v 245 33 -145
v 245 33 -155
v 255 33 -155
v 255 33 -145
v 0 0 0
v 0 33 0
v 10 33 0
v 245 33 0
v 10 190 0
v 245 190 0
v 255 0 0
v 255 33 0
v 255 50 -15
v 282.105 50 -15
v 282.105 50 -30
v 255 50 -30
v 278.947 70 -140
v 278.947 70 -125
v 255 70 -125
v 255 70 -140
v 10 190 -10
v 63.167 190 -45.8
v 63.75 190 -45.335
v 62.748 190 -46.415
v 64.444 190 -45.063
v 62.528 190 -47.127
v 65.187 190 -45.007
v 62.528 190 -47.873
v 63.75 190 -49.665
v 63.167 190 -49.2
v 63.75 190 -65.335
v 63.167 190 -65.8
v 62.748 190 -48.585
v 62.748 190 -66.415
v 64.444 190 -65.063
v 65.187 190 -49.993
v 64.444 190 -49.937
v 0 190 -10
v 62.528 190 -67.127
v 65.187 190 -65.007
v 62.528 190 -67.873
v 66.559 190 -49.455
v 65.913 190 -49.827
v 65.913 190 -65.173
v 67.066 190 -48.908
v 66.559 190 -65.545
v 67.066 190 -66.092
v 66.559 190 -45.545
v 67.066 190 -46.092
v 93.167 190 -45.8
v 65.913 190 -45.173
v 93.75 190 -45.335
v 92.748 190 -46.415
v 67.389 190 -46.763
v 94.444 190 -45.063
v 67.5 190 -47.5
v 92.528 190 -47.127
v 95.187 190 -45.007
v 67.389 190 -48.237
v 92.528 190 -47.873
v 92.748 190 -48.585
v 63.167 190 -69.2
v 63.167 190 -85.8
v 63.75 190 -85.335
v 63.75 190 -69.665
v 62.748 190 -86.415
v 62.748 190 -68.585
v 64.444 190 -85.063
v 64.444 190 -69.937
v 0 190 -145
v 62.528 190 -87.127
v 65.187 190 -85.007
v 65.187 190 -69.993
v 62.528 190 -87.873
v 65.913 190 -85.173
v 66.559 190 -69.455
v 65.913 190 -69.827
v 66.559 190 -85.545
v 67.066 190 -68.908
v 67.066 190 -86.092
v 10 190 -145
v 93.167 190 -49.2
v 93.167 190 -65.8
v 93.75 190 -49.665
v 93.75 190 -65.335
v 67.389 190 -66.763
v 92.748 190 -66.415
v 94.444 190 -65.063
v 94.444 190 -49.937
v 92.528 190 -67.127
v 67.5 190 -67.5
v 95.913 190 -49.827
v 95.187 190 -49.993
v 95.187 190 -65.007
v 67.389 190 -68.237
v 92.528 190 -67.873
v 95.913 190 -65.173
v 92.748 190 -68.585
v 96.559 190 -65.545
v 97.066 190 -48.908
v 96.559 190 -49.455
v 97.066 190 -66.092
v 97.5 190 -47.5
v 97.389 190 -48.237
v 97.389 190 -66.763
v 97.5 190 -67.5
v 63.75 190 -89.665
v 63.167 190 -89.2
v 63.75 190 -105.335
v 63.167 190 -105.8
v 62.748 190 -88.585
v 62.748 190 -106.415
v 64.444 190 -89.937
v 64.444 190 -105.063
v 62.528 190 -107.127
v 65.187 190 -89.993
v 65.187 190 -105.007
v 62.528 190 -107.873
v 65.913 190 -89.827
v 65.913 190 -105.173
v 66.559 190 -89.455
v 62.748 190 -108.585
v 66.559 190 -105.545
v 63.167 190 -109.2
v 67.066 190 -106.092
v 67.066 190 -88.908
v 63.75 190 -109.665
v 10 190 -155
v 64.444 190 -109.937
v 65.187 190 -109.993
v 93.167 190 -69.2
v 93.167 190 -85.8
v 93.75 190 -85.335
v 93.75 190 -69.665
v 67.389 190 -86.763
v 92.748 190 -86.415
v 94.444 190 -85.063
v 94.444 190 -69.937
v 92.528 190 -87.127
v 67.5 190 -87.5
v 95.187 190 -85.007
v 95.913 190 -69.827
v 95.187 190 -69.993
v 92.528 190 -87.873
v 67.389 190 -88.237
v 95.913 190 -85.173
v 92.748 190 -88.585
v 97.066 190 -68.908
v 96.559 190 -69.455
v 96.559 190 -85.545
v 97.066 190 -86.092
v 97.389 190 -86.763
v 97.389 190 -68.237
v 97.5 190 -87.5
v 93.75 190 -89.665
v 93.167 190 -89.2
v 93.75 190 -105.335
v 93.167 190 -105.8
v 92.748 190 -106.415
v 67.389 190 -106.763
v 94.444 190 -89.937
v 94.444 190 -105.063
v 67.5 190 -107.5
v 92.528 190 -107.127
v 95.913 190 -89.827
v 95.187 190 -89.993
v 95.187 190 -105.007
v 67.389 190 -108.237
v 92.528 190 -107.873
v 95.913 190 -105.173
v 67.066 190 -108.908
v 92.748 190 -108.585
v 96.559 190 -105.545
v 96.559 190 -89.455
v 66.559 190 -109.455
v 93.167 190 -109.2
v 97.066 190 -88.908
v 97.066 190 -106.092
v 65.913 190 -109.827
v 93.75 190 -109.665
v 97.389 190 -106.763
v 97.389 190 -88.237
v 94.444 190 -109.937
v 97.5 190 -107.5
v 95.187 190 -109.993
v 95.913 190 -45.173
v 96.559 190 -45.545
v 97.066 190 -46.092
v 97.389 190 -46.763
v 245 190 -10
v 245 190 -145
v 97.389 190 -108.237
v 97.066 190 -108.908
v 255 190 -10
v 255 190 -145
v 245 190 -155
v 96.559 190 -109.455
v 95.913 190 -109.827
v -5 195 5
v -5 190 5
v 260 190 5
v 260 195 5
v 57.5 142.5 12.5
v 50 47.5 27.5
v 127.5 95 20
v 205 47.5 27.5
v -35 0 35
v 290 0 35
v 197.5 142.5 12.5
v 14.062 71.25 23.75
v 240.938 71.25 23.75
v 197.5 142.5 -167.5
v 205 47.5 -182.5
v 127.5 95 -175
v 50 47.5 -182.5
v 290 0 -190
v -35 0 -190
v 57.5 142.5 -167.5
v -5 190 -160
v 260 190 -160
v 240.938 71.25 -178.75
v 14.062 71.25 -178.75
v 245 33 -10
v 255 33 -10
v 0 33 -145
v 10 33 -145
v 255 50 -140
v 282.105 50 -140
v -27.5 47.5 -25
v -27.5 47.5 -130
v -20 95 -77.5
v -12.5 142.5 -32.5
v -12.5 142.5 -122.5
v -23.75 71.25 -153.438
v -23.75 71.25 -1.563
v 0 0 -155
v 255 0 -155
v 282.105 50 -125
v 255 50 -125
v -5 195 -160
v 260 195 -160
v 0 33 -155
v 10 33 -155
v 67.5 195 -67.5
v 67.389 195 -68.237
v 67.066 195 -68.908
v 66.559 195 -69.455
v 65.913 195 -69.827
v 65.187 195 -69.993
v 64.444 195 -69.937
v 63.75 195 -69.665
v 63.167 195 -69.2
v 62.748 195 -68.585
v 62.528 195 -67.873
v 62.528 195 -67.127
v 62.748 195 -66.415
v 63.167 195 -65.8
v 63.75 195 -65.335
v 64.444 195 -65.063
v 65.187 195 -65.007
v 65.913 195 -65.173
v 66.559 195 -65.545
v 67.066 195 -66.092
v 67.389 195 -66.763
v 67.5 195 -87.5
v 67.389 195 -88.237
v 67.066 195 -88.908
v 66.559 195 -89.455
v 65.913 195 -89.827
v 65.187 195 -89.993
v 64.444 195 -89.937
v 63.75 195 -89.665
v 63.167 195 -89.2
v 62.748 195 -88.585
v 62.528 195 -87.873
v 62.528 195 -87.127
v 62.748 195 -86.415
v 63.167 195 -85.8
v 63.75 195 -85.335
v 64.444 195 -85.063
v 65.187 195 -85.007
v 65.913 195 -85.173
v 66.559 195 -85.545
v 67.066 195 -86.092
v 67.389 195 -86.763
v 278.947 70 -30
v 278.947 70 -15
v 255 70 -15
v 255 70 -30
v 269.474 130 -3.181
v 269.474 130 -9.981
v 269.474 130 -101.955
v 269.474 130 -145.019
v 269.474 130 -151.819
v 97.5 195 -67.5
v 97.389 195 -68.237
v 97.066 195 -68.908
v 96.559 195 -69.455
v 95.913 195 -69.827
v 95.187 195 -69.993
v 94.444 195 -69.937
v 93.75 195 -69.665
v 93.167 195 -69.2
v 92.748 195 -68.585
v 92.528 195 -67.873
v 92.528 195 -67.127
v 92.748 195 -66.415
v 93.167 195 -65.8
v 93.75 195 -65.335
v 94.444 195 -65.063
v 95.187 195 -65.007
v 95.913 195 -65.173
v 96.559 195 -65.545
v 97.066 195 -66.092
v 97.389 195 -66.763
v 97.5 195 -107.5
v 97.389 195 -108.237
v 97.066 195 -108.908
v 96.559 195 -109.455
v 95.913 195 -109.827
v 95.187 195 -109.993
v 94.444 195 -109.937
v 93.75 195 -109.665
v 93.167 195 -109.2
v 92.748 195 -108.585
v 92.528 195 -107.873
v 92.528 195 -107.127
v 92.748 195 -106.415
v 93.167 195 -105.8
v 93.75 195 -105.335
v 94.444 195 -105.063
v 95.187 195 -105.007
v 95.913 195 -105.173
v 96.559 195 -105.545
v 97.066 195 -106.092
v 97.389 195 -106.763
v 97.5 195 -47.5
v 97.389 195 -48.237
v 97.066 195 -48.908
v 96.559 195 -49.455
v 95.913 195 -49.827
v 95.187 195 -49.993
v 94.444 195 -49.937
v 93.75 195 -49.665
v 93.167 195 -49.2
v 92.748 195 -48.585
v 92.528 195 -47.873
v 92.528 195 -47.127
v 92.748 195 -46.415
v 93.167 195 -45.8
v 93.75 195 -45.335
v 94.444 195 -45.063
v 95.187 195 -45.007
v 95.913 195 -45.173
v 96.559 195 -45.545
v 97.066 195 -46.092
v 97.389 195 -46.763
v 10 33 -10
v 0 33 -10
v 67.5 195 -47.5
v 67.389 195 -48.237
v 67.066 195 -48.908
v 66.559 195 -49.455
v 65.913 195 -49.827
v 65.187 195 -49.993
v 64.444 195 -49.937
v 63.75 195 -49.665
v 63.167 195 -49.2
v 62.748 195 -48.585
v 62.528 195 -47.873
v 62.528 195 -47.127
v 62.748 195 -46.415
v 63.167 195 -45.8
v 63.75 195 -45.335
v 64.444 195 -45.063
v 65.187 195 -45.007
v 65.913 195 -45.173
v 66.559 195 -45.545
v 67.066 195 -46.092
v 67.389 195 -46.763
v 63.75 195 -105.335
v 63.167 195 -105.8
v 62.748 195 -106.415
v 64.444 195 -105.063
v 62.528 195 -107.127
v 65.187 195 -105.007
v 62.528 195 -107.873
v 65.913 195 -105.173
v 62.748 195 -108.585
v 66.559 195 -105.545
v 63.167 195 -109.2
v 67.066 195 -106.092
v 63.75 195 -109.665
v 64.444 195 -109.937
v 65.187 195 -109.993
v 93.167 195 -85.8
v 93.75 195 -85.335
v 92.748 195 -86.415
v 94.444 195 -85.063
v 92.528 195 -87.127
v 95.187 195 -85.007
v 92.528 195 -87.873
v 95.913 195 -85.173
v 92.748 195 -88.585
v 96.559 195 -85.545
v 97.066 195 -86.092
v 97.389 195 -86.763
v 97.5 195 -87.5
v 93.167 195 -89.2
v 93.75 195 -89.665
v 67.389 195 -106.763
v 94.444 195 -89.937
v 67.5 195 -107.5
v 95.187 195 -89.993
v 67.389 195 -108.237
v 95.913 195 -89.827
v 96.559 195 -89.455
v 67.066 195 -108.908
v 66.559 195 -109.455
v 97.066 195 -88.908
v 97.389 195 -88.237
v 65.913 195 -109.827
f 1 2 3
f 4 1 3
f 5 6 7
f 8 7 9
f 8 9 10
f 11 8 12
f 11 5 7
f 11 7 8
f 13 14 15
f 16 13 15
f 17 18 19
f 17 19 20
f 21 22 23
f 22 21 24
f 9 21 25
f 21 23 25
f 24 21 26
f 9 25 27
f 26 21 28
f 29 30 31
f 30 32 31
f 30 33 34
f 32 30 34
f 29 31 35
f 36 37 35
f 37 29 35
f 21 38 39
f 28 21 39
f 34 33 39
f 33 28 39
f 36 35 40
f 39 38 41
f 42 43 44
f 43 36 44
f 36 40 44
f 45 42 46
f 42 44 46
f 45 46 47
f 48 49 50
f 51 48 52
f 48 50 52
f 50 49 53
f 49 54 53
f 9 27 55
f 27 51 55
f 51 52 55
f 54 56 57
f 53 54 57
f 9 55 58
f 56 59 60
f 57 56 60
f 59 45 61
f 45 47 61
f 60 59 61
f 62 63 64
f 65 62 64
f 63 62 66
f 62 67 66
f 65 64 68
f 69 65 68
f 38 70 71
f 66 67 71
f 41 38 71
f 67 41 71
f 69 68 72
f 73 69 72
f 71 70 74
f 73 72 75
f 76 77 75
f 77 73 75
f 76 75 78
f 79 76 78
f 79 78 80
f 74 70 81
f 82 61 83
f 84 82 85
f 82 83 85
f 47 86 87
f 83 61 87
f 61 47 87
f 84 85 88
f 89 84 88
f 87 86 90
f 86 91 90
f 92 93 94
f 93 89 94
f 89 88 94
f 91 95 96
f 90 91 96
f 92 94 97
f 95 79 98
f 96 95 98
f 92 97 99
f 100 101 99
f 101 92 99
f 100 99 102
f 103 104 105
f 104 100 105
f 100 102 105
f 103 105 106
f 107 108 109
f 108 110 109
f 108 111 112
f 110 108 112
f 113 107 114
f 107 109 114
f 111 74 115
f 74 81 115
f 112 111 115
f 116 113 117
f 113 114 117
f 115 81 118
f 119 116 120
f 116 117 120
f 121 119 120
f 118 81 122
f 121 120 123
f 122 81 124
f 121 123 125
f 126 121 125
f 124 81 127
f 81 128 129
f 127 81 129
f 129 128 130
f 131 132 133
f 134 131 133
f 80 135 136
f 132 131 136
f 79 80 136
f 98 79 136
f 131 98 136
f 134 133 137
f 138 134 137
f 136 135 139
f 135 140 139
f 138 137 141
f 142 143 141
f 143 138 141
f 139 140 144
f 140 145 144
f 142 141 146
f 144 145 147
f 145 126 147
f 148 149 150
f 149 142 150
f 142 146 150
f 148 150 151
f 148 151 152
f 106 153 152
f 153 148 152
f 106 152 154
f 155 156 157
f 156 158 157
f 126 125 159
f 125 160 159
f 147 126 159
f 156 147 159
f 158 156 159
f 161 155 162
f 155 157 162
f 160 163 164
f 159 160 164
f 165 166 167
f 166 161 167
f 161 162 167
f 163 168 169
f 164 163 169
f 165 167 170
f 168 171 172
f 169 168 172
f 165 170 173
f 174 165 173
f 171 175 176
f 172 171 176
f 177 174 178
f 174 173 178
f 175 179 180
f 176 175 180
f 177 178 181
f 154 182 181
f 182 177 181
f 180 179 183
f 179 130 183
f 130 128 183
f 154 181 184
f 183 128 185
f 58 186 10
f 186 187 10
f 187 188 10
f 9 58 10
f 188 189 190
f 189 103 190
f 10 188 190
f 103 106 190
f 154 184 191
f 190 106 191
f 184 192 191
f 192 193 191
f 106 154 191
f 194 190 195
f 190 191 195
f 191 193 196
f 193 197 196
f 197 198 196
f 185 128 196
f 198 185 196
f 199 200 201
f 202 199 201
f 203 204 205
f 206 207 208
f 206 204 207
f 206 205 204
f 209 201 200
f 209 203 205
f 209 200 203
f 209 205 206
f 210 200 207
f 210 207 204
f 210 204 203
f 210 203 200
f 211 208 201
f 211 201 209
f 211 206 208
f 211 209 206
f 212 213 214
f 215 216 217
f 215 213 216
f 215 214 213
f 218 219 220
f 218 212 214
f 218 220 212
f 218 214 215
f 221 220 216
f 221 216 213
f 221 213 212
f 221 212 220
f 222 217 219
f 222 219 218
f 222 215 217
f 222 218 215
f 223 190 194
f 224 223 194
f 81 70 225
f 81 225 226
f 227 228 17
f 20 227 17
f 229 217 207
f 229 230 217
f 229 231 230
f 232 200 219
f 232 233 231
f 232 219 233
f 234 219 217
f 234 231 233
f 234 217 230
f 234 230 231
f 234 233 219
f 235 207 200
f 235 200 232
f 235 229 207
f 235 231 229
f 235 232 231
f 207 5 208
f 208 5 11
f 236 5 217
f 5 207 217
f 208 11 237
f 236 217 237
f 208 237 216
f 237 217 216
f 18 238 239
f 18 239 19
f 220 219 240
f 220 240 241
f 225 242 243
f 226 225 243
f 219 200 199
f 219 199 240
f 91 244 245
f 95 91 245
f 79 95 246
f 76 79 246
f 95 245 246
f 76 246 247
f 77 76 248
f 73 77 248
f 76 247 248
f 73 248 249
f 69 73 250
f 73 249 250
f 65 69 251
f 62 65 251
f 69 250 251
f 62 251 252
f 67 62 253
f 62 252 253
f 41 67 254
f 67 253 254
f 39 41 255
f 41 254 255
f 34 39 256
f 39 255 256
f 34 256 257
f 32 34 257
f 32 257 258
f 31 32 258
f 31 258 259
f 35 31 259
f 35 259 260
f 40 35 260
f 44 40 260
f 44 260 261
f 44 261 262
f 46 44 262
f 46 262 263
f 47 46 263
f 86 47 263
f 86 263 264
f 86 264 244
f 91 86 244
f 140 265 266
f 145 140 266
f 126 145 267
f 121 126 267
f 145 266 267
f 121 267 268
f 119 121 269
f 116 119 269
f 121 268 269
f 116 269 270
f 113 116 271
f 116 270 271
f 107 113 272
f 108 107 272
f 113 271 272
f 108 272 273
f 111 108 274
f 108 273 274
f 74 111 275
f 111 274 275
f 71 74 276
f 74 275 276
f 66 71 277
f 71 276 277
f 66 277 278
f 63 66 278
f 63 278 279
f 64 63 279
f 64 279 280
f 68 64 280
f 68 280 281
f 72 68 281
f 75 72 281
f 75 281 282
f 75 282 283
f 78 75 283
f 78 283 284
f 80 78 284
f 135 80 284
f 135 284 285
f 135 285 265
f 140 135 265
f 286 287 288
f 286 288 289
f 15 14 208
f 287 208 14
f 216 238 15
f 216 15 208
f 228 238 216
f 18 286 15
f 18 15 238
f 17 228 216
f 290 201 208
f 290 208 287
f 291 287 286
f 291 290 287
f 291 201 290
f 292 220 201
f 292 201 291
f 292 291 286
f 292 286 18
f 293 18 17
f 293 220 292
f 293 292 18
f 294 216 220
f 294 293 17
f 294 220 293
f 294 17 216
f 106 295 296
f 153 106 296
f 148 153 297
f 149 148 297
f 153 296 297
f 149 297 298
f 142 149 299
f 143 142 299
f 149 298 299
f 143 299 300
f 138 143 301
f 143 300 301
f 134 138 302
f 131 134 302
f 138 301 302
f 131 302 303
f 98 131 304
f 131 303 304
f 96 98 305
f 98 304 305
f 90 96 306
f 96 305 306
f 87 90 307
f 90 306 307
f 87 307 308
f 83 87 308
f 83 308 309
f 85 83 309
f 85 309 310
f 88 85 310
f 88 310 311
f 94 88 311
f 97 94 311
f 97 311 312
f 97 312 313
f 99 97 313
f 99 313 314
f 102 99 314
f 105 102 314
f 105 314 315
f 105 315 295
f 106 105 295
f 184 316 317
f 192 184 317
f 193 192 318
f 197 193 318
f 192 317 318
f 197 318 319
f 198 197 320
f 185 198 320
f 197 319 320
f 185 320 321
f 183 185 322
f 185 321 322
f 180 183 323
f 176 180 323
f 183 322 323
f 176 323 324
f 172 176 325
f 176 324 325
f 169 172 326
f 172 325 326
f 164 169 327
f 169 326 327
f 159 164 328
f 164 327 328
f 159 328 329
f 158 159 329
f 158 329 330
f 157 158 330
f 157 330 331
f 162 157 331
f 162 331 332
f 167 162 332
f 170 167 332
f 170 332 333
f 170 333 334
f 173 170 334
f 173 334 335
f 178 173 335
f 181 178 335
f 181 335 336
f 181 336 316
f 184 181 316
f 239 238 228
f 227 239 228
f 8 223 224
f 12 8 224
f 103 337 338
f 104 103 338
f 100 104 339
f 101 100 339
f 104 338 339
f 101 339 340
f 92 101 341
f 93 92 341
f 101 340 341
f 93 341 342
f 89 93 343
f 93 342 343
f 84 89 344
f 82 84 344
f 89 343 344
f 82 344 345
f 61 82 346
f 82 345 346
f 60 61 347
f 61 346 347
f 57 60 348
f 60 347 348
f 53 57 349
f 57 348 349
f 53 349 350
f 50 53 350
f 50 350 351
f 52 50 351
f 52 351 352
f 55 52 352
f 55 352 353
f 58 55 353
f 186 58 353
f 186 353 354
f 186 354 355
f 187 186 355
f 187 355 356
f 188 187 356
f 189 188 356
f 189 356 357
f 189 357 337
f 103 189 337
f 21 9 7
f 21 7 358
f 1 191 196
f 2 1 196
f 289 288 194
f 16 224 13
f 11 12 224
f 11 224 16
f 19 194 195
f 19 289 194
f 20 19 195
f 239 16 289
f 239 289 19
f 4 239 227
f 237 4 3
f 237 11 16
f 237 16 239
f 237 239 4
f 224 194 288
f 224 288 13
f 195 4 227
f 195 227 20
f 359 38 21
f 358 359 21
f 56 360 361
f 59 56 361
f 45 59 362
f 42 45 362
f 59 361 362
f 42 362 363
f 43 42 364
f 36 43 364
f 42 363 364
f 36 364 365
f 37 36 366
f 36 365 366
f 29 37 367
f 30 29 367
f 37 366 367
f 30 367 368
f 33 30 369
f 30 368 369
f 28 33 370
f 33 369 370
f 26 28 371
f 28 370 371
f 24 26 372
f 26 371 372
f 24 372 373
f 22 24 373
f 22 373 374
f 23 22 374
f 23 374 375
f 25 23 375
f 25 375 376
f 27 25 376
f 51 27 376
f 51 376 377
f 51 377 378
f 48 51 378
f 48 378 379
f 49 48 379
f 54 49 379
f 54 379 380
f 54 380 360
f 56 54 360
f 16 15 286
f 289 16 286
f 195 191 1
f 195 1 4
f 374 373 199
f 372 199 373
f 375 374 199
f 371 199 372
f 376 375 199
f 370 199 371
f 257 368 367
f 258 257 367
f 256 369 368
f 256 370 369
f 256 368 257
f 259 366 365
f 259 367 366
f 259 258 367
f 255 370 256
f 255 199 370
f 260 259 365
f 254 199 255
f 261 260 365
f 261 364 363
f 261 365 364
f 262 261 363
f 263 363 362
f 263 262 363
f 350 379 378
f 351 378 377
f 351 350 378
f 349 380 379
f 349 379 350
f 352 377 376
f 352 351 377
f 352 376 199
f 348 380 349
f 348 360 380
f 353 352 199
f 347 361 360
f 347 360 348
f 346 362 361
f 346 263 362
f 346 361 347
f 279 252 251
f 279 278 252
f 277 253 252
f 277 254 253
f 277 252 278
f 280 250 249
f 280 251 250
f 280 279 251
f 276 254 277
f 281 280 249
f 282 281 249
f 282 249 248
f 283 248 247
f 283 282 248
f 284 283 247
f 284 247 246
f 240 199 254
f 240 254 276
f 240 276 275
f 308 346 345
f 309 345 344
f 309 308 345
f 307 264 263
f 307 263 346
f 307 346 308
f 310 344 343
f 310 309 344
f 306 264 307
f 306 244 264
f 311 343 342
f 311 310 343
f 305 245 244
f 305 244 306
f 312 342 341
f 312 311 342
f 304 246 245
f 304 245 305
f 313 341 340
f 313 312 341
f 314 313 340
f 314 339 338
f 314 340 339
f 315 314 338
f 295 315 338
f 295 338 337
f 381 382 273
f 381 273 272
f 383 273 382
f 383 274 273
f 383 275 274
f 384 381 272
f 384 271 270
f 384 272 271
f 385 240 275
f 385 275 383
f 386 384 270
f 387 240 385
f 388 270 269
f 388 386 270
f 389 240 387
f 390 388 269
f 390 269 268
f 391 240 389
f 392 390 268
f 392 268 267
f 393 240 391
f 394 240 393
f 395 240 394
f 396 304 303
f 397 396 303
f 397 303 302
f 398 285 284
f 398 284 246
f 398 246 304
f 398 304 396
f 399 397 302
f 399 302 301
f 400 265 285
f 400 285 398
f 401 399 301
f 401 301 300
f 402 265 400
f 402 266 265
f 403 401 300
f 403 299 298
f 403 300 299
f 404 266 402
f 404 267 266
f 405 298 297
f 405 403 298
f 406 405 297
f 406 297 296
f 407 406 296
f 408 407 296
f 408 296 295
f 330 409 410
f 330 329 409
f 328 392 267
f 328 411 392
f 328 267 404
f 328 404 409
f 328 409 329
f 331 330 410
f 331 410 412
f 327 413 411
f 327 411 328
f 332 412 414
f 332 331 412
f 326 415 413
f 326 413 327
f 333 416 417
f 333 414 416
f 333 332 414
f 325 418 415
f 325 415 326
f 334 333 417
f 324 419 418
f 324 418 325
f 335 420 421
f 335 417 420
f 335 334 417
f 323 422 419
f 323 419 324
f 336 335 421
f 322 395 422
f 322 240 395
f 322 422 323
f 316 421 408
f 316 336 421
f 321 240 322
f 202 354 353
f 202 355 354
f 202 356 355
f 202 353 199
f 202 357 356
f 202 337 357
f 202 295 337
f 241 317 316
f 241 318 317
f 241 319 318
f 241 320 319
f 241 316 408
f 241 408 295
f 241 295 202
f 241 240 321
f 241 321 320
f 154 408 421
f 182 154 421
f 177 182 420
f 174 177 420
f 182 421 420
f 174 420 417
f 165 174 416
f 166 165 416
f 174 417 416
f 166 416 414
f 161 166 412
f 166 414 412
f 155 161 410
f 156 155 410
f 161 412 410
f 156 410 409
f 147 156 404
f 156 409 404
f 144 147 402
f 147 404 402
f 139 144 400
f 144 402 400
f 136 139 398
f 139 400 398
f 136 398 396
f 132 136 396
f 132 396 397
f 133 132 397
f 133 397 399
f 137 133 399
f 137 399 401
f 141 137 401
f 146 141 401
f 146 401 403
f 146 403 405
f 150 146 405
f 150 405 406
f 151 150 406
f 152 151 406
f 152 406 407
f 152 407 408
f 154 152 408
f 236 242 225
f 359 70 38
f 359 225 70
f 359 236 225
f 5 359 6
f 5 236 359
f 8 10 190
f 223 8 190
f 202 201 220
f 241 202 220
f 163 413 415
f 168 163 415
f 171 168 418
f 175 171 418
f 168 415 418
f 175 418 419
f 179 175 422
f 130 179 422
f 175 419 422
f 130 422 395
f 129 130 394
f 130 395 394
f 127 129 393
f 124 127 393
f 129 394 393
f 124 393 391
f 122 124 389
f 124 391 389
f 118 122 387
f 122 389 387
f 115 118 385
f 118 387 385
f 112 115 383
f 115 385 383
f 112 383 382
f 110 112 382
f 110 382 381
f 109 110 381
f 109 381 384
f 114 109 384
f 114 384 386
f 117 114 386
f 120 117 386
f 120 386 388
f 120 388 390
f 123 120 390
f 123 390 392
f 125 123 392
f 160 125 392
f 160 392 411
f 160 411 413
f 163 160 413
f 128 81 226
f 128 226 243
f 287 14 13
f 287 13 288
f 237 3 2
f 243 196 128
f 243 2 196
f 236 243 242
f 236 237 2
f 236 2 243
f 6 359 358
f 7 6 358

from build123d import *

# Parameters (mm, degrees)
SKETCH2_W           = 325
SKETCH2_H           = 225
SKETCH4_W           = 265
SKETCH4_H           = 165
SKETCH8_W           = 255
SKETCH8_H           = 155
SKETCH9_W           = 255
SKETCH9_H           = 155
SKETCH10_W          = 265
SKETCH10_H          = 165
BOSS_EXTRUDE1_DEPTH = 5
SKETCH13_W          = 10
SKETCH13_H          = 10
BOSS_EXTRUDE2_DEPTH = 162
SKETCH14_R          = 2.5
CUT_EXTRUDE1_DEPTH  = 196.0000001
CUT_EXTRUDE2_REACH  = 327
SKETCH15_W          = 15
SKETCH15_H          = 20


with BuildPart() as part:
    # Sketch2 → Loft2 section 0
    with BuildSketch(Plane(origin=(0, 0, 0), x_dir=(1, 0, 0), z_dir=(0, 1, 0))):
        with Locations((127.5, 77.5)):
            Rectangle(SKETCH2_W, SKETCH2_H)
    # Sketch4 → Loft2 section 1
    with BuildSketch(Plane(origin=(0, 190, 0), x_dir=(1, 0, 0), z_dir=(0, 1, 0))):
        with Locations((127.5, 77.5)):
            Rectangle(SKETCH4_W, SKETCH4_H)
    loft()

    # Sketch8 → Cut-Loft1 section 0
    with BuildSketch(Plane(origin=(0, 190, 0), x_dir=(1, 0, 0), z_dir=(0, 1, 0))):
        with Locations((127.5, 77.5)):
            Rectangle(SKETCH8_W, SKETCH8_H)
    # Sketch9 → Cut-Loft1 section 1
    with BuildSketch(Plane.XZ):
        with Locations((127.5, -77.5)):
            Rectangle(SKETCH9_W, SKETCH9_H)
    loft(mode=Mode.SUBTRACT)

    # Sketch10 → Boss-Extrude1 (add)
    with BuildSketch(Plane(origin=(0, 190, 0), x_dir=(1, 0, 0), z_dir=(0, 1, 0))):
        with Locations((127.5, 77.5)):
            Rectangle(SKETCH10_W, SKETCH10_H)
    extrude(amount=BOSS_EXTRUDE1_DEPTH)

    # Sketch13 → Boss-Extrude2 (add)
    with BuildSketch(Plane(origin=(0, 33, 0), x_dir=(1, 0, 0), z_dir=(0, 1, 0))):
        with Locations((5, 150)):
            Rectangle(SKETCH13_W, SKETCH13_H)
        with Locations((250, 150)):
            Rectangle(SKETCH13_W, SKETCH13_H)
        with Locations((250, 5)):
            Rectangle(SKETCH13_W, SKETCH13_H)
        with Locations((5, 5)):
            Rectangle(SKETCH13_W, SKETCH13_H)
    extrude(amount=BOSS_EXTRUDE2_DEPTH)

    # Sketch14 → Cut-Extrude1 (cut, through all)
    with BuildSketch(Plane(origin=(0, 195, 0), x_dir=(1, 0, 0), z_dir=(0, 1, 0))):
        with Locations((65, 47.5)):
            Circle(SKETCH14_R)
        with Locations((65, 67.5)):
            Circle(SKETCH14_R)
        with Locations((95, 67.5)):
            Circle(SKETCH14_R)
        with Locations((95, 47.5)):
            Circle(SKETCH14_R)
        with Locations((95, 107.5)):
            Circle(SKETCH14_R)
        with Locations((95, 87.5)):
            Circle(SKETCH14_R)
        with Locations((65, 87.5)):
            Circle(SKETCH14_R)
        with Locations((65, 107.5)):
            Circle(SKETCH14_R)
    extrude(amount=-CUT_EXTRUDE1_DEPTH, mode=Mode.SUBTRACT)

    # Sketch15 → Cut-Extrude2 (cut, up to next)
    with BuildSketch(Plane(origin=(290, 0, 0), x_dir=(0, 0, -1), z_dir=(1, 0, 0)), mode=Mode.PRIVATE) as cut_extrude2_sk1:
        with Locations((22.5, 60)):
            Rectangle(SKETCH15_W, SKETCH15_H)
    cut_extrude2_tool1 = extrude(cut_extrude2_sk1.sketch, amount=-CUT_EXTRUDE2_REACH, mode=Mode.PRIVATE) & part.part
    add(cut_extrude2_tool1.solids().sort_by_distance((290, 60, -22.5))[0], mode=Mode.SUBTRACT)
    # Sketch15 → Cut-Extrude2 (cut, up to next)
    with BuildSketch(Plane(origin=(290, 0, 0), x_dir=(0, 0, -1), z_dir=(1, 0, 0)), mode=Mode.PRIVATE) as cut_extrude2_sk2:
        with Locations((132.5, 60)):
            Rectangle(SKETCH15_W, SKETCH15_H)
    cut_extrude2_tool2 = extrude(cut_extrude2_sk2.sketch, amount=-CUT_EXTRUDE2_REACH, mode=Mode.PRIVATE) & part.part
    add(cut_extrude2_tool2.solids().sort_by_distance((290, 60, -132.5))[0], mode=Mode.SUBTRACT)


solid = part.part
